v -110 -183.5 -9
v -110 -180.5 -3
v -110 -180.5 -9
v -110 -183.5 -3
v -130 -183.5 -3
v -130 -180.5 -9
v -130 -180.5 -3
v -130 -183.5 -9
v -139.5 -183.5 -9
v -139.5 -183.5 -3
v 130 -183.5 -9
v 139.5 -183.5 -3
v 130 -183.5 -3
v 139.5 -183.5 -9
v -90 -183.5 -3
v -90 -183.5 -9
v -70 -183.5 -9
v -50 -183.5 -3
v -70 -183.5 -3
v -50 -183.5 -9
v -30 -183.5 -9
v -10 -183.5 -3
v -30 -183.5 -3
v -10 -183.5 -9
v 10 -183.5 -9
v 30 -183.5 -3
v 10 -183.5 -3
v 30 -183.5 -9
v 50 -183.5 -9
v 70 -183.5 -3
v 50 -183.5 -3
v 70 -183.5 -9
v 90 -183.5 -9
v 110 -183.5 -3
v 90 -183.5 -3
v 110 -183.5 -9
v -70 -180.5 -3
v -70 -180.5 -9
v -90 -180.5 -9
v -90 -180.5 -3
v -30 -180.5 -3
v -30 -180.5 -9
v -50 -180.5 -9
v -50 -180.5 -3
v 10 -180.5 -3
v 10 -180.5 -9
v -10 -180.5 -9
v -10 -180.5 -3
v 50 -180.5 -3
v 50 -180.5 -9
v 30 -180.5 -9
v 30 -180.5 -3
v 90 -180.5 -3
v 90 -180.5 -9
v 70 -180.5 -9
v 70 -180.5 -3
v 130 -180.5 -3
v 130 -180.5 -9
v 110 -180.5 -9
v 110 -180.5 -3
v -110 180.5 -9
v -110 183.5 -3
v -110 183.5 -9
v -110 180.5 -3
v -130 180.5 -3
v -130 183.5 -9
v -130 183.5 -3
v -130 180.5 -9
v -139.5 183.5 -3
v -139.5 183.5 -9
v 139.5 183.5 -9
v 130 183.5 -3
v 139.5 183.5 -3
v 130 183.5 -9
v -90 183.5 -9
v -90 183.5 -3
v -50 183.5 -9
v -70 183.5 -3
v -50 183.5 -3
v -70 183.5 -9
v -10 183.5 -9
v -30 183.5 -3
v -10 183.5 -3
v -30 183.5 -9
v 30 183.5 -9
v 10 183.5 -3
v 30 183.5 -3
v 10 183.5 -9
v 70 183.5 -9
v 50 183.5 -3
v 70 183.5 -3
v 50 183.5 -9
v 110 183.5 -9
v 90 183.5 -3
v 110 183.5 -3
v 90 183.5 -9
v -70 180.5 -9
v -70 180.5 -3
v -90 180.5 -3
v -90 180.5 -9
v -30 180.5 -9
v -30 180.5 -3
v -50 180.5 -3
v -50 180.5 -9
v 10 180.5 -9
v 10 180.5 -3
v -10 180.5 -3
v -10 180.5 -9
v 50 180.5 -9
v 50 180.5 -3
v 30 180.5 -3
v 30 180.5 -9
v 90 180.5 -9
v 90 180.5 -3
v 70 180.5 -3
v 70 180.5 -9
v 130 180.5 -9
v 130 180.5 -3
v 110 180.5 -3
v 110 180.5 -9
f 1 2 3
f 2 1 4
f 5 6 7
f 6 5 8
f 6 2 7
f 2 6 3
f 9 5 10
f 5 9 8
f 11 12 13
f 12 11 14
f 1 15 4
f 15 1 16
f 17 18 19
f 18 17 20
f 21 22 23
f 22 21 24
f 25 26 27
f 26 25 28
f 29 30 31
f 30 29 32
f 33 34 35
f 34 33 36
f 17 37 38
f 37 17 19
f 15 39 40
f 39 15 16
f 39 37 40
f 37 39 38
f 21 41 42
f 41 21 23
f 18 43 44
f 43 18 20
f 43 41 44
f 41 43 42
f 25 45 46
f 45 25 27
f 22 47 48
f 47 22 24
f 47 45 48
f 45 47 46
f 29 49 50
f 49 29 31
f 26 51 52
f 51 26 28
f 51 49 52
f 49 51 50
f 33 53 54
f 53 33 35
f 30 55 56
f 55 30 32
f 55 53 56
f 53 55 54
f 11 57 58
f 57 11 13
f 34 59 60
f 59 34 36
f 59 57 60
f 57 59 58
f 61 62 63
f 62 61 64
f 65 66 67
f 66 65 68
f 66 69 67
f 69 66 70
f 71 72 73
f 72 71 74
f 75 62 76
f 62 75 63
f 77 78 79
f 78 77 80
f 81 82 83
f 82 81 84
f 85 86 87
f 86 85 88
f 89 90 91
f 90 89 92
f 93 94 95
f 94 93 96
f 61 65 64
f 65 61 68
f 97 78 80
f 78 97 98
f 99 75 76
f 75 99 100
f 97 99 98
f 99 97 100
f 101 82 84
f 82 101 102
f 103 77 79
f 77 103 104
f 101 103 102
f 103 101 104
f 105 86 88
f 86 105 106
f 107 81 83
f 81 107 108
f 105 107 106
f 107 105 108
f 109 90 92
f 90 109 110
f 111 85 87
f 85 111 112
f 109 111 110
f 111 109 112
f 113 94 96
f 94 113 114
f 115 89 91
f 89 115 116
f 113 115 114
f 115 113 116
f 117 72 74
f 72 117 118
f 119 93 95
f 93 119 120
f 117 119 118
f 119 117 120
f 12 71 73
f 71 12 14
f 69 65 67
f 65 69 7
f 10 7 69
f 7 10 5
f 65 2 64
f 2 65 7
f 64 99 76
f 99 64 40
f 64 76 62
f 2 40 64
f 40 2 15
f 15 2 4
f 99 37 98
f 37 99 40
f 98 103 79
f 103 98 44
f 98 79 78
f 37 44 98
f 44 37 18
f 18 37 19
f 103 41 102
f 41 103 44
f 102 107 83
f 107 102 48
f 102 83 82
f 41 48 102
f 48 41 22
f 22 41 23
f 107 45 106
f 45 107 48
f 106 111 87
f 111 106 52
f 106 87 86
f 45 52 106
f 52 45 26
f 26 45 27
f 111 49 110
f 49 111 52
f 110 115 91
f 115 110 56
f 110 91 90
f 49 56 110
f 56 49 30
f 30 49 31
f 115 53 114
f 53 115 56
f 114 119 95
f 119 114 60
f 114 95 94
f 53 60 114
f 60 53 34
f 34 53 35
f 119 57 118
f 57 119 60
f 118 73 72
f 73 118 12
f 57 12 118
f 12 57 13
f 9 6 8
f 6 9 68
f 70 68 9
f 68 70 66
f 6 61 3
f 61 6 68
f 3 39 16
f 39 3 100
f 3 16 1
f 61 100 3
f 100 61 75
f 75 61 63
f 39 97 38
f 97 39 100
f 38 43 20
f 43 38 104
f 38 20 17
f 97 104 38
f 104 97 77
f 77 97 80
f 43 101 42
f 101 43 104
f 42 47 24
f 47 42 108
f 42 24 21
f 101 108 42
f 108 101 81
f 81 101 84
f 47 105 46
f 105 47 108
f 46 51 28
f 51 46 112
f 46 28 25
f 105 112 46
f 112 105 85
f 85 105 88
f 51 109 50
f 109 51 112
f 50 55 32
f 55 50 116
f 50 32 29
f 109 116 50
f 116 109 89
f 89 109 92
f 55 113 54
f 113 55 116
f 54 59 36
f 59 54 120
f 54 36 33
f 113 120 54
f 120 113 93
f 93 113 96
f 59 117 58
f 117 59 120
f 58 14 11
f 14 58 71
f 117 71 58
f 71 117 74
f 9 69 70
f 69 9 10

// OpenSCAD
layout=[3,4];
//layout=[2,3];
//layout=[4,6];
//layout=[2,1];
thickness=6;
div_thickness=3;
ct=thickness;
ch=20;
lid_height=30;
lid_thickness=3;
lid_tab=20;
material_depth=304;
material_width=609.6;

upright=true;
handle_width=85;

// champain bottle
bottle_height=299;
bottle_width=85;

// 750ml bottle
//bottle_height=291;
//bottle_width=80;

// 12oz normal
//bottle_height=196;
//bottle_width=65.5;

// 12oz tall
//bottle_height=226;
//bottle_width=61;

// 16oz swingtop
//bottle_height=256;
//bottle_width=71;

div_height=bottle_height/2;
side_length=layout[1]*bottle_width+
             (layout[1]-1)*div_thickness+
             thickness*2;
end_length=layout[0]*bottle_width+
             (layout[0]-1)*div_thickness+
             thickness*2;

//%cube([300, 600, 6]);
//bottles();
//case();
//lid_end();
//bottles24();
//end();
//outside();
//divider();
//lid();
//lid_end();
//champagne_layout();
//lid();
//end();
//model();
bottom();

//use<East Border.ttf>
//linear_extrude(height = 5)
//text("MPS BREW", size=50, font="East Border");

module champagne_layout(){
bottle_height=299;
bottle_width=85;
  %cube([300, 600, 6],center=true);
//  translate([-bottle_height/2,-120,0]) rotate([0,90,0]) outside();
  translate([-bottle_height/2,-160,0]) rotate([90,0,90]) divider();
}

module model(){
//  translate([0,0,bottle_height+thickness]) rotate([0,180,0]) lid();
  case();
  lid();
}

module lid(){
  translate([end_length/2-thickness/2,side_length/2-thickness/2,0]){
    bottom();
//    for(X=[-1,1]) 
//        translate([(end_length+lid_thickness)/2*X,0,(lid_height-thickness)/2]) 
//            rotate([0,90,0]) lid_side();
//    for(Y=[-1,1])
//        translate([0,(side_length+lid_thickness)/2*Y,(lid_height-thickness)/2]) 
//            rotate([-90,0,0]) lid_end();
  }
}

module lid_end(){
    tabs=4;
    union(){
      translate([0,-thickness/2,0])
    cube([end_length, lid_height-lid_thickness,lid_thickness], center=true);

    for(X=[0:1:tabs])
      translate([X*(end_length/(tabs*2)), (lid_height-thickness)/2,0]) 
        cube([end_length/(tabs*2), ct, lid_thickness], center=true);
    for(X=[-1,1])
      translate([(end_length+lid_thickness)/2*X,0,0])
        cube([ct, lid_height/2, lid_thickness], center=true);
    }
}

module lid_side(){
  difference(){
    union(){
      translate([-thickness/2,0,0])
      cube([lid_height-thickness,side_length,lid_thickness], center=true);
//    for(Y=[-1.5,0,1.5])
//      translate([(lid_height-thickness)/2, bottle_width*Y, 0])
//        cube([ct, bottle_width/2, thickness], center=true);
    }
//    for(Y=[-1,1])
//      translate([0,(bottle_width*2+thickness*3)*Y,0])
//        cube([lid_height/2, ct, thickness+2], center=true);
  }
}


module bottom(){
  translate([0,0,-thickness])
  difference(){
    cube([end_length+lid_thickness*2, side_length+lid_thickness*2, thickness], center=true);
    end_tabs = floor(floor(end_length/ch)/2);
    for(Y=[-1,1], X=[-end_tabs:2:end_tabs])
      translate([ch*X, (side_length+lid_thickness)/2*Y,0]) 
        cube([ch, lid_thickness, thickness+2], center=true);
    echo(side_length/ch);
    
    side_tabs = floor(floor(side_length/ch-1)/2);
    for(X=[-1,1], Y=[-side_tabs:2:side_tabs])
      translate([(end_length+lid_thickness)/2*X,Y*ch,0]) 
        %cube([lid_thickness, ch, thickness+2], center=true);
  }
}

module case(){
  translate([0, -thickness/2, 0]) outside();
  translate([end_length-thickness, -thickness/2, 0]) outside();
  if(upright){
    for(X=[1:1:layout[0]-1])
      translate([(bottle_width+div_thickness)*X, 0, 0])
        inside();
  
    for(Y=[1:1:layout[1]-1])
      translate([-thickness/2, div_thickness/2+(bottle_width+  div_thickness)*Y,0])
        divider();
  }
  translate([0, side_length-thickness, 0]) end();
  translate([0, 0, 0]) end();
}

module outside(){
  difference(){
    translate([-thickness/2,0,0])
      cube([thickness, side_length, bottle_height]);
    for(Y=[thickness/2,side_length-thickness/2], Z=[30:40:bottle_height])
      translate([0, Y, Z]) 
        cube([thickness+2, ct, ch], center=true);
    for(Y=[1:1:layout[1]-1], Z=[30:40:div_height+1])
      translate([0, -div_thickness/2+thickness+(bottle_width+div_thickness)*Y,Z]) 
        cube([thickness+2, div_thickness, ch], center=true);
  }
}

module inside(){
  difference(){
    translate([0,-thickness/2,0]) 
      cube([div_thickness, side_length, div_height]);
    
    for(Y=[1:1:layout[1]-1])
    translate([0, div_thickness/2+(bottle_width+div_thickness)*Y,div_height*.25])
      cube([thickness+2, div_thickness, div_height/2], center=true);
    for(Y=[0,side_length-thickness], Z=[30:40:bottle_height])
      translate([0, Y, Z]) 
        cube([thickness+2, ct, ch], center=true);
  }
}

module end(){
  difference(){
    translate([-thickness/2,-thickness/2,0]) 
      cube([end_length, thickness, bottle_height],center=false);
     translate([end_length/2, 0, 0])
    hull()
      for(X=[-1,1]) rotate([90,0,0]) translate([(handle_width/2-15)*X, bottle_height-lid_height-15, 0]) 
        cylinder(d=30,h=thickness+2, center=true);
    for(X=[0,end_length-thickness], Z=[10:40:bottle_height])
      translate([X,0,Z]) 
        cube([ct, thickness+2, ch], center=true);
    
    if(upright){
      for(X=[1:1:layout[0]-1], Z=[10:40:div_height])
        translate([div_thickness/2+(bottle_width+div_thickness)*X, 0, Z])
        cube([div_thickness, thickness+2, ch], center=true);
    }
  }
}

module divider(){
  difference(){
    translate([0,-div_thickness/2,0]) 
      cube([end_length, div_thickness, div_height]);
    for(X=[thickness/2,end_length-thickness/2], Z=[10:40:div_height])
      translate([X,0,Z]) 
        cube([ct, thickness+2, ch], center=true);
    for(X=[1:1:layout[0]-1]) 
      translate([thickness/2+div_thickness/2+(bottle_width+div_thickness)*X, 0, div_height*.75]) 
        cube([div_thickness, thickness+2, div_height/2], center=true);
  }
}

module bottles24(){
  for(X=[0:1:layout[0]-1], Y=[0:1:layout[1]-1]) 
    translate([((bottle_width+thickness)/2)+(bottle_width+div_thickness)*X,(bottle_width+thickness)/2+(bottle_width+div_thickness)*Y,0]) 
      %bottle();
}

module bottles(){
  for(X=[-1,0,1], Y=[-1.5,-0.5,0.5,1.5]) 
    translate([(bottle_width+thickness)*X,(bottle_width+thickness)*Y,0]) 
      %bottle();
}

module bottle(){
  cylinder(d=bottle_width, h=bottle_height*.50);
  translate([0,0,bottle_height*.50]) 
        cylinder(d1=bottle_width, d2=26, h=bottle_height*.50);
}
